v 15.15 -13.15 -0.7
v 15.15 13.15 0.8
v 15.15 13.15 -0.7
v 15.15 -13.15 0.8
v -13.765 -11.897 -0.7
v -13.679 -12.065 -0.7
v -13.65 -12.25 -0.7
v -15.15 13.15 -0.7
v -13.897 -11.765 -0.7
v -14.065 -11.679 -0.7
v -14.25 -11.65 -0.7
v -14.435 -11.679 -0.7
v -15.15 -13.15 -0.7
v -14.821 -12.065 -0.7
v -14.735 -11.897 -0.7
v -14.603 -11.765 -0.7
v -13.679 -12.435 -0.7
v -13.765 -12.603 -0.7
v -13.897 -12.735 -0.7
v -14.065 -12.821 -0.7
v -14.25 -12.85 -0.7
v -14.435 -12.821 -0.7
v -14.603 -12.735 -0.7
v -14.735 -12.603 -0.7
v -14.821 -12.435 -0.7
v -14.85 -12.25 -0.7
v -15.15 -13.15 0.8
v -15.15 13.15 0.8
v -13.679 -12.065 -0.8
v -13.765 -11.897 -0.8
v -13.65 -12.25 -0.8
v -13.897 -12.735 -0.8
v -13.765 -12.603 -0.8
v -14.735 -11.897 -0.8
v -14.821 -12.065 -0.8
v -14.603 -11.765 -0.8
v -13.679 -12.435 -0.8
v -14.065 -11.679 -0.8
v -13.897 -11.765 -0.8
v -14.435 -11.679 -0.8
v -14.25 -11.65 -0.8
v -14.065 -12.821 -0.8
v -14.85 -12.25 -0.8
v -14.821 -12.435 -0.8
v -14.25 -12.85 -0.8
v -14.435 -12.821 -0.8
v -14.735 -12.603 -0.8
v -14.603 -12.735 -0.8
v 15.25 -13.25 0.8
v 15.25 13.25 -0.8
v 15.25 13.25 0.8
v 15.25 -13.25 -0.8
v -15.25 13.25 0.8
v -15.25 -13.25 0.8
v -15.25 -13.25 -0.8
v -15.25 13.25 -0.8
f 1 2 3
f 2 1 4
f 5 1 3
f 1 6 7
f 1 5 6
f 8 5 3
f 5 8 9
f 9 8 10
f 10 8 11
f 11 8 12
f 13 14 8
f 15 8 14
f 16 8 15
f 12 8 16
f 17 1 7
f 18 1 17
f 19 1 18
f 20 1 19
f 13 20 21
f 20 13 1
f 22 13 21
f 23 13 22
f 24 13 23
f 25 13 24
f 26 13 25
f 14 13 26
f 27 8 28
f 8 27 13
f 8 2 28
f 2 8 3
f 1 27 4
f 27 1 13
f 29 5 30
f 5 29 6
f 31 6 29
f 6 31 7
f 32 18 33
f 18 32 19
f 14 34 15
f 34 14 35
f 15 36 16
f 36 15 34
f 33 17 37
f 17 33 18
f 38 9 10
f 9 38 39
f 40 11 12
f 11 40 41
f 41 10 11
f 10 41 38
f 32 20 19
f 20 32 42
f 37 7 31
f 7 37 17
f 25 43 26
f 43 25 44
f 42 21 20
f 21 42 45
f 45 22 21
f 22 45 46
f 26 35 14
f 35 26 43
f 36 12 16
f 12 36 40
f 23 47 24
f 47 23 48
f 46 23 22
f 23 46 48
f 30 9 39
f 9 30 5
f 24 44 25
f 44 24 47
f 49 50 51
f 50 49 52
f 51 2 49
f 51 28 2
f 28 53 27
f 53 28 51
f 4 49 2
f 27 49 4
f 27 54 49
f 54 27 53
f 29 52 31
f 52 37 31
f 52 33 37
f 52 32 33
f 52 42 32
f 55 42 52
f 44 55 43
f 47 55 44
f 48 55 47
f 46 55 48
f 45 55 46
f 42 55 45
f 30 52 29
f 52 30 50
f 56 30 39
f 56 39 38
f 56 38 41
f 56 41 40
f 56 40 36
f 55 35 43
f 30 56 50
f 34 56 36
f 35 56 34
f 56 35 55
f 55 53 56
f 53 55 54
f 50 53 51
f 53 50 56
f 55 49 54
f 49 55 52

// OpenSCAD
default_pan_width = 29.5+1;
default_pan_depth = 26.5;

pan_shoulder_h = 1.6;
pan_metal_t = 0.1;

module bottom_pan(
    pan_width = default_pan_width,
    pan_depth = default_pan_depth)
{
    translate([0,0,0]) 
    {
        color("green")
        difference() 
        {
            cube ([pan_width, 
                pan_depth, pan_shoulder_h], 
                    center = true);
            
            union()
            {    
                translate([0,0,pan_metal_t])
                cube ([pan_width-2*pan_metal_t, 
                    pan_depth-2*pan_metal_t,
                    pan_shoulder_h], 
                    center = true);
                translate([-pan_width/2+1,-pan_depth/2+1,0])
                cylinder(h = pan_shoulder_h+0.2, d = 1.2, $fn=20, center=true);
            }
        }
    }
}

bottom_pan();
